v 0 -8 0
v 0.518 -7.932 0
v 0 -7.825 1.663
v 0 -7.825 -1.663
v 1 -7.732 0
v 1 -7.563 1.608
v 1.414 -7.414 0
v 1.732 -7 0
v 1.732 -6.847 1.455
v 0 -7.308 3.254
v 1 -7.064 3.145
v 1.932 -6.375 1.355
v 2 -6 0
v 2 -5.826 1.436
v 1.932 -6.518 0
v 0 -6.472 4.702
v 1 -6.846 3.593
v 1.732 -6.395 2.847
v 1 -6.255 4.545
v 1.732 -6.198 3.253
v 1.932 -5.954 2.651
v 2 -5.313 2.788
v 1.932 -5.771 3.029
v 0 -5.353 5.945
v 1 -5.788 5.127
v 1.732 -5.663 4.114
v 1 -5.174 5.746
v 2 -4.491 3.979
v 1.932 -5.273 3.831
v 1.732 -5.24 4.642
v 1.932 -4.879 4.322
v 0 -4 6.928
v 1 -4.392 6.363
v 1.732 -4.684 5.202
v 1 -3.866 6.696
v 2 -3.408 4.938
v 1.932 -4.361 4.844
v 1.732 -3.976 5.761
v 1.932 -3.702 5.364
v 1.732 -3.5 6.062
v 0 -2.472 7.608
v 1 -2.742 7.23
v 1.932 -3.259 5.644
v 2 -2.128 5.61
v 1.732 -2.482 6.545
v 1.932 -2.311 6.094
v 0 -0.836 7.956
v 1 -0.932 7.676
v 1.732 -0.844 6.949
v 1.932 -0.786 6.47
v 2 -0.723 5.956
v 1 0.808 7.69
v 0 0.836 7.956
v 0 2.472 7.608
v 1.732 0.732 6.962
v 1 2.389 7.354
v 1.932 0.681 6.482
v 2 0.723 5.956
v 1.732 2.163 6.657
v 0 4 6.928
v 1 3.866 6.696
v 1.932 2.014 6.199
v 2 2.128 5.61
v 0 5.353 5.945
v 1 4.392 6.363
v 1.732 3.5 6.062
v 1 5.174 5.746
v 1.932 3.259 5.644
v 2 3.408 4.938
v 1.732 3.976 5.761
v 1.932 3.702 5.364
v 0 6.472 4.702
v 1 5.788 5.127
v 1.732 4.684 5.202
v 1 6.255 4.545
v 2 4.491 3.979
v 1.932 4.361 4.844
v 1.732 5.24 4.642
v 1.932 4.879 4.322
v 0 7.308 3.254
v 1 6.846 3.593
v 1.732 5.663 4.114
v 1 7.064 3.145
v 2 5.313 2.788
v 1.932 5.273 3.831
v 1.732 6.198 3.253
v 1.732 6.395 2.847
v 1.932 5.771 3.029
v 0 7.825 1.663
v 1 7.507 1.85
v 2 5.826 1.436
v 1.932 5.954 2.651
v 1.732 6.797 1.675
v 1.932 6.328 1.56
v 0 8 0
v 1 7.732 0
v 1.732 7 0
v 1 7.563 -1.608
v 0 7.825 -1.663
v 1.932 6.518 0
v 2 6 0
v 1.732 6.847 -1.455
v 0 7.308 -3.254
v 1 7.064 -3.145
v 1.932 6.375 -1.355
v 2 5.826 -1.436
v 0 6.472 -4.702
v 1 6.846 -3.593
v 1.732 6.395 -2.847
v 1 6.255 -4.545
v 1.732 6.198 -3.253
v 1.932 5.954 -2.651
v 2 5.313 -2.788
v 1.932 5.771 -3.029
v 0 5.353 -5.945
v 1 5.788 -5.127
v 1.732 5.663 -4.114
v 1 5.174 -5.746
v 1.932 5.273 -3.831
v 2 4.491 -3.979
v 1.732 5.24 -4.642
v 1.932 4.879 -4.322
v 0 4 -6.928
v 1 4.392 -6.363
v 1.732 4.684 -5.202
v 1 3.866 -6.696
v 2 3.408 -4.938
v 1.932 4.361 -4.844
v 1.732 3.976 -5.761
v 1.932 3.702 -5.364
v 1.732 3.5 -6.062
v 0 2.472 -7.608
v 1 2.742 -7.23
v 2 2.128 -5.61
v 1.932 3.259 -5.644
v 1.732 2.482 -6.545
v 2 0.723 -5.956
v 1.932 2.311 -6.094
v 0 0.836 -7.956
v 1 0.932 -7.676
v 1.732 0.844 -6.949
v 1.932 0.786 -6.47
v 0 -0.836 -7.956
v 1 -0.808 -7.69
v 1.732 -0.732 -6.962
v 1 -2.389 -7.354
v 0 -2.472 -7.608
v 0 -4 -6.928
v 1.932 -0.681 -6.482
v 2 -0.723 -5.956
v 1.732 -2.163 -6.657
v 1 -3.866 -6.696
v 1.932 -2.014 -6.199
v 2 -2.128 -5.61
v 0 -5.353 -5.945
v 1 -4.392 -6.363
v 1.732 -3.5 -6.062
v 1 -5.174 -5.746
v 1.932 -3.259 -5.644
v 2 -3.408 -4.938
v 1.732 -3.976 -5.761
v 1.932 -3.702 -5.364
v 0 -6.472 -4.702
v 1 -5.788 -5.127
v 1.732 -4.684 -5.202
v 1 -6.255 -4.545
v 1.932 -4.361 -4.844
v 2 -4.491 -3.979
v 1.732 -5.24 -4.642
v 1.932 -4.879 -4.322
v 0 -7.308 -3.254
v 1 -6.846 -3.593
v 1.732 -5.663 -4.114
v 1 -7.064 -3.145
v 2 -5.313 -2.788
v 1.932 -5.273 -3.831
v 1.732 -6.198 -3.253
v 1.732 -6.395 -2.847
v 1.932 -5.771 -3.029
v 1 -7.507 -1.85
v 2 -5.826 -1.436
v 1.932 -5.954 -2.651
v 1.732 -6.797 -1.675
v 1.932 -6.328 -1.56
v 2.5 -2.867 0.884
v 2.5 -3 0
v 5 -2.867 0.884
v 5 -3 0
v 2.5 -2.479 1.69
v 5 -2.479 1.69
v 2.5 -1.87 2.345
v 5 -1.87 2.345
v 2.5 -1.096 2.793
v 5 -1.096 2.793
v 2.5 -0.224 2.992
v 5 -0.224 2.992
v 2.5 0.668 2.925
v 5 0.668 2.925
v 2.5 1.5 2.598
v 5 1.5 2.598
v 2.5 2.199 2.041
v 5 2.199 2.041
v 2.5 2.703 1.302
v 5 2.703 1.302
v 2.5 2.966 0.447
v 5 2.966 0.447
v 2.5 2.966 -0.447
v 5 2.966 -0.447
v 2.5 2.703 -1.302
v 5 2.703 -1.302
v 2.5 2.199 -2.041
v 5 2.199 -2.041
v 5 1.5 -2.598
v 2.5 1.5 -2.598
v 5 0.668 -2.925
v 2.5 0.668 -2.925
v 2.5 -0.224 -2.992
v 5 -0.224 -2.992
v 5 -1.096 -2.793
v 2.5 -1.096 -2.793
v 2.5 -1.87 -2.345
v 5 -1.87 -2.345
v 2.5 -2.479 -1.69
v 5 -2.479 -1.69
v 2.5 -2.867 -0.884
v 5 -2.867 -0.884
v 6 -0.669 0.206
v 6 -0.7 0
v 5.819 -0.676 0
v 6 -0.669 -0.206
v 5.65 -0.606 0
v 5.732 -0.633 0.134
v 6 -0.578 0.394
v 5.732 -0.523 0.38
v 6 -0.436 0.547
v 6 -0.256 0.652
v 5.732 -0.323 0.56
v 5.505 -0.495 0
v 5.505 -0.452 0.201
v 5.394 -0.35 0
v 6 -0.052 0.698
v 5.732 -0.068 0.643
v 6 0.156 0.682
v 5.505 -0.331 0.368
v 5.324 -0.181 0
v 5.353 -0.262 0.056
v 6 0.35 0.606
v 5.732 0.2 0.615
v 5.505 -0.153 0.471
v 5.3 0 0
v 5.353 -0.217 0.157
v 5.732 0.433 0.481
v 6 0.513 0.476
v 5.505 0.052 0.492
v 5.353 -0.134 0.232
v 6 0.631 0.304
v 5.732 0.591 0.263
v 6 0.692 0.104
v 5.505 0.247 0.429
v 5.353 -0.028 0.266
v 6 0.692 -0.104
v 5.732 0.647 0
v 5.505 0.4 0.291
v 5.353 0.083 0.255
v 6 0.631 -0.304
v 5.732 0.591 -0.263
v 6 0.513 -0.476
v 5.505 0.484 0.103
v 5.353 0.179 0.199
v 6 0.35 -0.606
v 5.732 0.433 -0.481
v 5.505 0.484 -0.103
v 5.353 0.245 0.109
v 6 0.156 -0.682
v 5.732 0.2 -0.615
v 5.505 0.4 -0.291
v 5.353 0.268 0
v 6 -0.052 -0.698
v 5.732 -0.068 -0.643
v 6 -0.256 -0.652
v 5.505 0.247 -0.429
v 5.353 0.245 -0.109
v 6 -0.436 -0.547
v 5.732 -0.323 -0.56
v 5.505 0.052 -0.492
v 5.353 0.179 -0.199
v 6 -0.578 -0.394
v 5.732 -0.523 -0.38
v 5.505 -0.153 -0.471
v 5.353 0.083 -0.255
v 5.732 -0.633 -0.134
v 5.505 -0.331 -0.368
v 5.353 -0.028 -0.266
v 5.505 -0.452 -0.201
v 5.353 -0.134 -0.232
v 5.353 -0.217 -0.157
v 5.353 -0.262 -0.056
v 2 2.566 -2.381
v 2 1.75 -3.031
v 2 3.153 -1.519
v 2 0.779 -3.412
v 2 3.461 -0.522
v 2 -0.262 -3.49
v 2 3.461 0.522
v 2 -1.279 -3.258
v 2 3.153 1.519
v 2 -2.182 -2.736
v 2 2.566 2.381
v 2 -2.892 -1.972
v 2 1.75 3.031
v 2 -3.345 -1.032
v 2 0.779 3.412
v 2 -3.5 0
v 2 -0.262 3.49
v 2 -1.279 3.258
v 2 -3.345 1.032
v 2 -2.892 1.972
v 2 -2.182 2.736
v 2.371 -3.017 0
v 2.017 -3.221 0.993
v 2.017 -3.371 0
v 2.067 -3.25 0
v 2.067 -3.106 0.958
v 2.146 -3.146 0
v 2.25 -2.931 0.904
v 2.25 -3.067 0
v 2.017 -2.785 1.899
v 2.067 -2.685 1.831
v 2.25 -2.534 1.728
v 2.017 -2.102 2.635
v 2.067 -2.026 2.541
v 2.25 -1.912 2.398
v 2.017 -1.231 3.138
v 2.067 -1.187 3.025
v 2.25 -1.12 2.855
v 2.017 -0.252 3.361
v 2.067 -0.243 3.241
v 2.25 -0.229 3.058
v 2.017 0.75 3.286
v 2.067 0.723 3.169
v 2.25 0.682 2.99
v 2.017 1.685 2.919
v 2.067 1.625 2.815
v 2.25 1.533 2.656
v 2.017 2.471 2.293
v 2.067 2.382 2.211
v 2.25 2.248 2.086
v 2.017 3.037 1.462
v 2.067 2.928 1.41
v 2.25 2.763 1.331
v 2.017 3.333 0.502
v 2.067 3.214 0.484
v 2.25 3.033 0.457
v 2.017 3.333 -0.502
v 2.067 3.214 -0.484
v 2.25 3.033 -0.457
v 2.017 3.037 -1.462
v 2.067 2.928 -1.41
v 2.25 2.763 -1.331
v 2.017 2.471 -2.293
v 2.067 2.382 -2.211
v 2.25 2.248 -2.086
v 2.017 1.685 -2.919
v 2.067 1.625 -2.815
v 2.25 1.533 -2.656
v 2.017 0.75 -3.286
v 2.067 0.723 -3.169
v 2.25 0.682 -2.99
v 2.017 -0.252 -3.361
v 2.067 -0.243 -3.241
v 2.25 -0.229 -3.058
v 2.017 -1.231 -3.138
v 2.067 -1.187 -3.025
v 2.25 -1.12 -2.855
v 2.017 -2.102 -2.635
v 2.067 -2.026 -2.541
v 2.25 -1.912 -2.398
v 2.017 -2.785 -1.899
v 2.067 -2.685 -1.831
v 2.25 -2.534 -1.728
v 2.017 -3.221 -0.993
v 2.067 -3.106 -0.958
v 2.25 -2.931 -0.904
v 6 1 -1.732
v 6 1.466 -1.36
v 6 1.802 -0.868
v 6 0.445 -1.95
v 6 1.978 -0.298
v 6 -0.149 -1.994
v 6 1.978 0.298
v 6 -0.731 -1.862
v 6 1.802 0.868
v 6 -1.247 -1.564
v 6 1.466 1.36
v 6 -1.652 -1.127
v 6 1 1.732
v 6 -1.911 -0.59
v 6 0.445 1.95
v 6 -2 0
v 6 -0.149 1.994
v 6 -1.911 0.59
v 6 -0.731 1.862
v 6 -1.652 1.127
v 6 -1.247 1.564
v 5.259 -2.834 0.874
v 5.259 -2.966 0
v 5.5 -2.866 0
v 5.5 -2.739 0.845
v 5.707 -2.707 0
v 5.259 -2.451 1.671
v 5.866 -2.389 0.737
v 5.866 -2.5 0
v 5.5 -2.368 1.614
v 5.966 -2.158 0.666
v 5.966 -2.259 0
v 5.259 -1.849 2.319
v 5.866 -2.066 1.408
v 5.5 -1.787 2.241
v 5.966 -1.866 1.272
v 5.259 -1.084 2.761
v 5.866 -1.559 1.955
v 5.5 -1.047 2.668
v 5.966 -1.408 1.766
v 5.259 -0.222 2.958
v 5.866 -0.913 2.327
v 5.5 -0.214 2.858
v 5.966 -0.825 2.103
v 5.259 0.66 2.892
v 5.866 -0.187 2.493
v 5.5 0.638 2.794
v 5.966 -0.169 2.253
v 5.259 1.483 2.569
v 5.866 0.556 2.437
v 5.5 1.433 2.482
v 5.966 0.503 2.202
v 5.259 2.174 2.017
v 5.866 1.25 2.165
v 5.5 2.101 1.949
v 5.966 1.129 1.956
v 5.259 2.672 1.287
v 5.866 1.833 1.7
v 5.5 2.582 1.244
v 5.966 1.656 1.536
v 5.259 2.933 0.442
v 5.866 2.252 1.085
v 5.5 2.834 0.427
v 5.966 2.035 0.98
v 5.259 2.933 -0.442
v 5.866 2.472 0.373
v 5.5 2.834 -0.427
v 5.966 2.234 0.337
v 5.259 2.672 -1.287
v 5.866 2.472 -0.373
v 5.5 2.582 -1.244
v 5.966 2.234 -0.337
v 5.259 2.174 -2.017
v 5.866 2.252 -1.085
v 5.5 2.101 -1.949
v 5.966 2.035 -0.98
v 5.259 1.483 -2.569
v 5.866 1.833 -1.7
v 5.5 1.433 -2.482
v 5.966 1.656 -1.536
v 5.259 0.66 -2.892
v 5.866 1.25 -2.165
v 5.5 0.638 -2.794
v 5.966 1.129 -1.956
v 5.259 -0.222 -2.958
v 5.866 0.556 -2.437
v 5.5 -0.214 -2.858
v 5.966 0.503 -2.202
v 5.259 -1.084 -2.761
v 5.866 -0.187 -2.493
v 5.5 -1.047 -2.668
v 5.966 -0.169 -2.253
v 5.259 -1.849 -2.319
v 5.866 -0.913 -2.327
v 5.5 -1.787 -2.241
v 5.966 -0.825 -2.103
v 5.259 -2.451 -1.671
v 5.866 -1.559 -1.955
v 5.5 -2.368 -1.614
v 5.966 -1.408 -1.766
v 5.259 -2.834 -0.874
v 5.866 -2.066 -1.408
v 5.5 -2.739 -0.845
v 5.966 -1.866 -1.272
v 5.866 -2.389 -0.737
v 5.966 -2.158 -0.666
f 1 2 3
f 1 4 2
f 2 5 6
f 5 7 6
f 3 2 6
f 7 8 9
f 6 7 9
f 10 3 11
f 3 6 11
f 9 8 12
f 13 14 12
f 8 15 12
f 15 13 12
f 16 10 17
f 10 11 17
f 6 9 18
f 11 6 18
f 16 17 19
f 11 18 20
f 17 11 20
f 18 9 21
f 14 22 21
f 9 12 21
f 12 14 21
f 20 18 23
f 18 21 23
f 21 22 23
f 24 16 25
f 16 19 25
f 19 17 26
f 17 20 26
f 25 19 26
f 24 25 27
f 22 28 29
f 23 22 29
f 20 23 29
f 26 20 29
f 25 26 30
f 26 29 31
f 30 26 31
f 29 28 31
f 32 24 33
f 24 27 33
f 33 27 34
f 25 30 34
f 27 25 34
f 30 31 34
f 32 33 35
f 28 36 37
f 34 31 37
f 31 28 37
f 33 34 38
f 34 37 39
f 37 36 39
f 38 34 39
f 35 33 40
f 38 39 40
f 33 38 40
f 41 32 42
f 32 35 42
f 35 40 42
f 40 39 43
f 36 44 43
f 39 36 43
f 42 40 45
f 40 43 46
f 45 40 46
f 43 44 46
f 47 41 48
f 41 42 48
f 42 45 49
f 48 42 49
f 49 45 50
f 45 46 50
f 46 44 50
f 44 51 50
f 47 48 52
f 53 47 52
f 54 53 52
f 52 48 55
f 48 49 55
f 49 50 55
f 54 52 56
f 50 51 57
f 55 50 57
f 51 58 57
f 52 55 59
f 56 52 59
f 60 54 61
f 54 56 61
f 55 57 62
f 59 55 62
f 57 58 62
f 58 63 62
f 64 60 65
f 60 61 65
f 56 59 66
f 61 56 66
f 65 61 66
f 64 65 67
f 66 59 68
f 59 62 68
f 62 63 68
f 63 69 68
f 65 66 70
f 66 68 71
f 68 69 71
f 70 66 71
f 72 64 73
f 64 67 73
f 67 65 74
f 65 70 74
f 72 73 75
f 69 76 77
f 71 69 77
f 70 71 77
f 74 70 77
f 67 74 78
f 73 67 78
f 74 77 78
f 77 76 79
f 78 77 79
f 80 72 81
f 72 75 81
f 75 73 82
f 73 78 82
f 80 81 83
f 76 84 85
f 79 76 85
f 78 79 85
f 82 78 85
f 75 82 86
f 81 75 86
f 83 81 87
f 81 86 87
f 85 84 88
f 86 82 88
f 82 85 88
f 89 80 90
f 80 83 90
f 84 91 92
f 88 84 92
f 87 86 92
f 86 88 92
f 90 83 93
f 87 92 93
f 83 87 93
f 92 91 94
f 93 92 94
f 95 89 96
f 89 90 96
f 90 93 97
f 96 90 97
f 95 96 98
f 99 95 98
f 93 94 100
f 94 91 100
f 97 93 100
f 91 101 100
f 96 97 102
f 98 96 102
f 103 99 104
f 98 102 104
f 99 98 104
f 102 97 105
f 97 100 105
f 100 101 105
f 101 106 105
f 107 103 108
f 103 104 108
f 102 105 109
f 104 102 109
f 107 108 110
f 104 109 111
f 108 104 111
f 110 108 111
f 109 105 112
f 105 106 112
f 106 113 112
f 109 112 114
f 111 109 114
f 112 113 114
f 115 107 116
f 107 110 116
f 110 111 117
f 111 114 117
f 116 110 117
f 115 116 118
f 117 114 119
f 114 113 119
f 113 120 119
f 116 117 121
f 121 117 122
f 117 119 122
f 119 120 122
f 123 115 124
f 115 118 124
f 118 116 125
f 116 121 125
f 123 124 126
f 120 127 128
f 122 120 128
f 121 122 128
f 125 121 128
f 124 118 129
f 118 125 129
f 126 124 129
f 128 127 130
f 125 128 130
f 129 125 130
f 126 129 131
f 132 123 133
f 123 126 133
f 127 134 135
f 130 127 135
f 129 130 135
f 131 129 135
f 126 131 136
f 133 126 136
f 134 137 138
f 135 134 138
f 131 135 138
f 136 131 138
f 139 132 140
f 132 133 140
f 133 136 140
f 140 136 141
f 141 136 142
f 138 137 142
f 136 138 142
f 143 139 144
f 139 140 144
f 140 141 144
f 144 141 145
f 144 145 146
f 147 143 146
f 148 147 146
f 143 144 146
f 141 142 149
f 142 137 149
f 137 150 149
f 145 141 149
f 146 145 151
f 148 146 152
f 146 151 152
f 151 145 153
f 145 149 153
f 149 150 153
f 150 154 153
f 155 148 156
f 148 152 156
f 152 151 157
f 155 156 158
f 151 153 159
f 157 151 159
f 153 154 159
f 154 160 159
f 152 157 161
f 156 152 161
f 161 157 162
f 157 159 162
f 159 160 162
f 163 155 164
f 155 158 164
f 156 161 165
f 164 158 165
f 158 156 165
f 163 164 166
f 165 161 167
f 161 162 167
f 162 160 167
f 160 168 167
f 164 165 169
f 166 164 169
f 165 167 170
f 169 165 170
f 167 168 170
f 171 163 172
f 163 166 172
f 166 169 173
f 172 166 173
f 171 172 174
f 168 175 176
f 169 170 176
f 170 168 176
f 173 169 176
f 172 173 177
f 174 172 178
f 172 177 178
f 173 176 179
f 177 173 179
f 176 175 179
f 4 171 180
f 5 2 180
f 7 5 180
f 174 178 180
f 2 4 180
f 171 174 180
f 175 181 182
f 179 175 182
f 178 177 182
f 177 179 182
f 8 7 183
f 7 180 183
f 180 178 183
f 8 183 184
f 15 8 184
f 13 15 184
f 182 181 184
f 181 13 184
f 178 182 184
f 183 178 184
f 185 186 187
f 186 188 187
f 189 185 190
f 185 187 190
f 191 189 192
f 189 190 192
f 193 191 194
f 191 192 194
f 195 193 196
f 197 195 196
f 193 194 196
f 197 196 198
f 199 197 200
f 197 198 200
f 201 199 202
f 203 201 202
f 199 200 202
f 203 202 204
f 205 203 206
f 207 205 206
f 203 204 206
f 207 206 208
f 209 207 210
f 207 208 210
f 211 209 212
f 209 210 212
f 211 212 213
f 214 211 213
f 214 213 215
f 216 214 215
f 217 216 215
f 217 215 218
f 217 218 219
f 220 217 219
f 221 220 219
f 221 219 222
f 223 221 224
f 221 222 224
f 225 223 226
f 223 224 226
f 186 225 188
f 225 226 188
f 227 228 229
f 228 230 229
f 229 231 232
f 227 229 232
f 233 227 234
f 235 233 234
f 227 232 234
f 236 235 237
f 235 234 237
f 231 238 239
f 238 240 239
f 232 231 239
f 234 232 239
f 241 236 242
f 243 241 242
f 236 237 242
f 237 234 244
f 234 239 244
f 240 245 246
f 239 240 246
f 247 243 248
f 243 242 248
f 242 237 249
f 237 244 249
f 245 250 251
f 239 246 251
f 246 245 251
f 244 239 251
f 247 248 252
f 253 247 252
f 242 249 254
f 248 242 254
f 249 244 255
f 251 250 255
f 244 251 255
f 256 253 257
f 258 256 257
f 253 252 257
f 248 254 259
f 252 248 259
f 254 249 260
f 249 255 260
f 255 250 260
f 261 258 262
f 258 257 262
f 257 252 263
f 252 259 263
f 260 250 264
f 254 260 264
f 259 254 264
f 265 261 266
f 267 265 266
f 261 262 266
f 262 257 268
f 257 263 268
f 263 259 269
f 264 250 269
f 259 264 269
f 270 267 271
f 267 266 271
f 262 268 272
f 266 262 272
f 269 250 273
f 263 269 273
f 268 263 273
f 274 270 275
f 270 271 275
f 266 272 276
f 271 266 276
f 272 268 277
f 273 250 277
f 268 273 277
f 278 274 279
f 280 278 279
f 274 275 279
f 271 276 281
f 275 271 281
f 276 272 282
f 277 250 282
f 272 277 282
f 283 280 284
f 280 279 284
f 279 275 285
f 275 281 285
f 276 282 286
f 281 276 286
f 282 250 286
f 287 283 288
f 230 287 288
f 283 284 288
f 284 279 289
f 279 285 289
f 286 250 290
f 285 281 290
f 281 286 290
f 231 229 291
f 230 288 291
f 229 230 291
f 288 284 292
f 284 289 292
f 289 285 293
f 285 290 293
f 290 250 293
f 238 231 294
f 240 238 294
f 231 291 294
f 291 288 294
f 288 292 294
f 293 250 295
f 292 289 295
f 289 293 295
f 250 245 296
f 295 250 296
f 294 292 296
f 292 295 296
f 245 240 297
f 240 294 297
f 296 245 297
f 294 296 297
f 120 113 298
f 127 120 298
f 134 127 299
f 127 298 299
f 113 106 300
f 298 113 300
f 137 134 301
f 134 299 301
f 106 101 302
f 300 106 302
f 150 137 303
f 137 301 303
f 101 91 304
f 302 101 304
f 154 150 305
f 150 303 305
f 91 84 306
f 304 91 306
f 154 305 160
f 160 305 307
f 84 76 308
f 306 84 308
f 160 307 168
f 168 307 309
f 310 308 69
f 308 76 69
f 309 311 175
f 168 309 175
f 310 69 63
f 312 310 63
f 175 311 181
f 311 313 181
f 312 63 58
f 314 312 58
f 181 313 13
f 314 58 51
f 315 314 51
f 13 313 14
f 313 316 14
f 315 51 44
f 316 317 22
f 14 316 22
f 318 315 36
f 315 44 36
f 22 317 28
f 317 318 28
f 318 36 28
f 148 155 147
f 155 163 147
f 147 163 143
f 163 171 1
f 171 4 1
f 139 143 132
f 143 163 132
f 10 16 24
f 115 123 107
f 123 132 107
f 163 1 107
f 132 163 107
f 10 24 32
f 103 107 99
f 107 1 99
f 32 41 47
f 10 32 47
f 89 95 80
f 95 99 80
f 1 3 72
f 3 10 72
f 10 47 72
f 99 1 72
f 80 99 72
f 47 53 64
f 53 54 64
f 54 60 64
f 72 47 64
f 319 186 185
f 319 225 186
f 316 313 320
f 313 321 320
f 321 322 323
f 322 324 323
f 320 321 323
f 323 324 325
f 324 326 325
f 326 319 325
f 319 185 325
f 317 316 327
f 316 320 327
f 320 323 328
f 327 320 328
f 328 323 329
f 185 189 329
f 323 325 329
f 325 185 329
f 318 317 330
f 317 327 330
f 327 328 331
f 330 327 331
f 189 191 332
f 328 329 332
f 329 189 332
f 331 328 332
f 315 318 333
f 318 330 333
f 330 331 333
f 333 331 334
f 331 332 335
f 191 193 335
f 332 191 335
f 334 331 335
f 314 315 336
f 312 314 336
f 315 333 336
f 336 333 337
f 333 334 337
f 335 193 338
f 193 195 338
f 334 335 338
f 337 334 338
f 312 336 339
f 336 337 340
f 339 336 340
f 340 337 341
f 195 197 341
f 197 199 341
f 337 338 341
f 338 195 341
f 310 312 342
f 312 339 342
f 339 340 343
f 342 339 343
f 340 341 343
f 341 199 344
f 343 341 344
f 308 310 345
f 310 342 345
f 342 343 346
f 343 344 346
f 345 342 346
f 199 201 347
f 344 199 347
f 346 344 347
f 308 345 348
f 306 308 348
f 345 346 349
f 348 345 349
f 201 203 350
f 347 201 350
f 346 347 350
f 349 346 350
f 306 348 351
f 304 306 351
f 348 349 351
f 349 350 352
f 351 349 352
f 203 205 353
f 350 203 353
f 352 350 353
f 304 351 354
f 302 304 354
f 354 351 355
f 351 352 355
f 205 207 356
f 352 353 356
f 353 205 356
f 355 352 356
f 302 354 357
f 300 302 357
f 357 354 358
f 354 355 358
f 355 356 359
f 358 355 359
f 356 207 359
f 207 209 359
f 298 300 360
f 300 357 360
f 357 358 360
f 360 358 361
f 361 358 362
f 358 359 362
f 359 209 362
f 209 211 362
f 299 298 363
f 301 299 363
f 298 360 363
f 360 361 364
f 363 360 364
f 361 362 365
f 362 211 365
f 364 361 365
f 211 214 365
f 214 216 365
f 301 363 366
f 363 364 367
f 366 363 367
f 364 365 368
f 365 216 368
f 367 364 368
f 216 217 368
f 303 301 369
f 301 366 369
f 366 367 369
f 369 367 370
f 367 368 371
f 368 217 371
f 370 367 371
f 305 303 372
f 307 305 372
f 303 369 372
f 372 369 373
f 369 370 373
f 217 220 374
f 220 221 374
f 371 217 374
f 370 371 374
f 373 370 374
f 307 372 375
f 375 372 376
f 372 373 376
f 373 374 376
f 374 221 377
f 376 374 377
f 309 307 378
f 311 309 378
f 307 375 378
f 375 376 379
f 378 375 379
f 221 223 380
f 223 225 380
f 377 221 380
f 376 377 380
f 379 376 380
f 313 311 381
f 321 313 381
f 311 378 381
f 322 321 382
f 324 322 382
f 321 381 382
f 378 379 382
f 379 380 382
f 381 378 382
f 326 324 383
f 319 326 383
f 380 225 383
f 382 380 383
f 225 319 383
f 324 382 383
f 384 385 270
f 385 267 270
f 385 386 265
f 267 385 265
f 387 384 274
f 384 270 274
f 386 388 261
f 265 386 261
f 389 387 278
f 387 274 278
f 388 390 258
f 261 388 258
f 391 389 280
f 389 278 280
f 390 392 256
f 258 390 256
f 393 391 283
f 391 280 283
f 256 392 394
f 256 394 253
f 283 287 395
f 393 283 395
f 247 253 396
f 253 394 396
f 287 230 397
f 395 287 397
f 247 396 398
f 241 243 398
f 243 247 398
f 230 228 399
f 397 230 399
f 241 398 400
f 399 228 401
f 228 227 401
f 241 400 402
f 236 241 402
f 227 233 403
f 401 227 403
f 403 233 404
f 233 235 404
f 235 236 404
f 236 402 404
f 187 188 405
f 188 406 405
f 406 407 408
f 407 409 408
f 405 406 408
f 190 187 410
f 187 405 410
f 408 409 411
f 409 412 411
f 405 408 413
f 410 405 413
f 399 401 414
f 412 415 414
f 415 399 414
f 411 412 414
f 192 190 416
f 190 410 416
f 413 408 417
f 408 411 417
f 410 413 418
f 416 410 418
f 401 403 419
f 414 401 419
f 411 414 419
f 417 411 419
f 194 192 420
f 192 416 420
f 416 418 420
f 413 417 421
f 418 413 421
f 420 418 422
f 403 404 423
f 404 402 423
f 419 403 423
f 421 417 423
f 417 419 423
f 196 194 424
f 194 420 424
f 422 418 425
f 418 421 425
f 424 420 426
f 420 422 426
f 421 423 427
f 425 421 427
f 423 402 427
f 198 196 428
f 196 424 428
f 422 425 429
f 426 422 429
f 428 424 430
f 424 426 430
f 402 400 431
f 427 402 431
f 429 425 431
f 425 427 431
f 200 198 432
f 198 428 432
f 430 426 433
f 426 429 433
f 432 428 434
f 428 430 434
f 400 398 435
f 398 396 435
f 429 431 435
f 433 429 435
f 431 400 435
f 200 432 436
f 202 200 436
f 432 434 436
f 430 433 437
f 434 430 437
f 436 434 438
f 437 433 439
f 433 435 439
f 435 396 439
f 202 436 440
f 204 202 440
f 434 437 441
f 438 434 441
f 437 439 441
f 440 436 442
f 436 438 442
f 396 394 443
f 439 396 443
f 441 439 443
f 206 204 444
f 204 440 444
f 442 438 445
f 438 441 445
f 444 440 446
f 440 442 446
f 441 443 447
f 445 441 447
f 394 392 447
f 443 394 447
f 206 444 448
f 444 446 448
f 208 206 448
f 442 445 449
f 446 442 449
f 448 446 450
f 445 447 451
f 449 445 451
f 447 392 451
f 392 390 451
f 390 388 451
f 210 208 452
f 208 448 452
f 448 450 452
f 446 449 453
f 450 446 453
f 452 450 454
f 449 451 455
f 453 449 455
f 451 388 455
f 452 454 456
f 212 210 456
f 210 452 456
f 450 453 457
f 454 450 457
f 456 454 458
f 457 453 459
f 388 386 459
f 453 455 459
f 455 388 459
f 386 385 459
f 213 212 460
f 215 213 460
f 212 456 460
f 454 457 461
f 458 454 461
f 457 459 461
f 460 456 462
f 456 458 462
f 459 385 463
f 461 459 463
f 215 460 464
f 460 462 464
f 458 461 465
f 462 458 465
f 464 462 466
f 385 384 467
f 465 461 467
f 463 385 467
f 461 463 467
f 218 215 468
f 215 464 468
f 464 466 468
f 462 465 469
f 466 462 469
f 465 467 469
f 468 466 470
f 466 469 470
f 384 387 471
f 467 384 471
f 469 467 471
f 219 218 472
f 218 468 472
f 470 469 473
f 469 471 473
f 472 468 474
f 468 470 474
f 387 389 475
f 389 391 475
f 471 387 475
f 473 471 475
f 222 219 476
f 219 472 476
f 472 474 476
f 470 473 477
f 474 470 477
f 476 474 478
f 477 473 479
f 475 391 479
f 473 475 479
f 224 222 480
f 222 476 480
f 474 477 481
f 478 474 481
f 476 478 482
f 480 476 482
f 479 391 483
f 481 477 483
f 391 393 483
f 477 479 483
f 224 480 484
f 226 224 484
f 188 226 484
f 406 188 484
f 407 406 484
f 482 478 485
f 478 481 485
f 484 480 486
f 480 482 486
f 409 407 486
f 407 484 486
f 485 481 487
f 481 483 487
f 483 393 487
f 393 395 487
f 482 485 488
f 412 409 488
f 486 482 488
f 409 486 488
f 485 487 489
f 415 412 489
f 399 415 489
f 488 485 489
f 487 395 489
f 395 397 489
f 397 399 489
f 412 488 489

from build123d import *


with BuildPart() as part:
    # 草图1 → 旋转1 (revolve)
    with BuildSketch(Plane.XY):
        with BuildLine():
            Line((0, 0), (0, 8))
            ThreePointArc((0, 8), (1.414213562, 7.414213562), (2, 6))
            Line((2, 6), (2, 3.5))
            ThreePointArc((2, 3.5), (2.146446609, 3.146446609), (2.5, 3))
            Line((2.5, 3), (5, 3))
            ThreePointArc((5, 3), (5.707106781, 2.707106781), (6, 2))
            Line((6, 2), (6, 0.7))
            ThreePointArc((6, 0.7), (5.505025253, 0.494974747), (5.3, 0))
            Line((5.3, 0), (0, 0))
        make_face()
    revolve(axis=Axis((6, 0, 0), (-1, 0, 0)))


solid = part.part
